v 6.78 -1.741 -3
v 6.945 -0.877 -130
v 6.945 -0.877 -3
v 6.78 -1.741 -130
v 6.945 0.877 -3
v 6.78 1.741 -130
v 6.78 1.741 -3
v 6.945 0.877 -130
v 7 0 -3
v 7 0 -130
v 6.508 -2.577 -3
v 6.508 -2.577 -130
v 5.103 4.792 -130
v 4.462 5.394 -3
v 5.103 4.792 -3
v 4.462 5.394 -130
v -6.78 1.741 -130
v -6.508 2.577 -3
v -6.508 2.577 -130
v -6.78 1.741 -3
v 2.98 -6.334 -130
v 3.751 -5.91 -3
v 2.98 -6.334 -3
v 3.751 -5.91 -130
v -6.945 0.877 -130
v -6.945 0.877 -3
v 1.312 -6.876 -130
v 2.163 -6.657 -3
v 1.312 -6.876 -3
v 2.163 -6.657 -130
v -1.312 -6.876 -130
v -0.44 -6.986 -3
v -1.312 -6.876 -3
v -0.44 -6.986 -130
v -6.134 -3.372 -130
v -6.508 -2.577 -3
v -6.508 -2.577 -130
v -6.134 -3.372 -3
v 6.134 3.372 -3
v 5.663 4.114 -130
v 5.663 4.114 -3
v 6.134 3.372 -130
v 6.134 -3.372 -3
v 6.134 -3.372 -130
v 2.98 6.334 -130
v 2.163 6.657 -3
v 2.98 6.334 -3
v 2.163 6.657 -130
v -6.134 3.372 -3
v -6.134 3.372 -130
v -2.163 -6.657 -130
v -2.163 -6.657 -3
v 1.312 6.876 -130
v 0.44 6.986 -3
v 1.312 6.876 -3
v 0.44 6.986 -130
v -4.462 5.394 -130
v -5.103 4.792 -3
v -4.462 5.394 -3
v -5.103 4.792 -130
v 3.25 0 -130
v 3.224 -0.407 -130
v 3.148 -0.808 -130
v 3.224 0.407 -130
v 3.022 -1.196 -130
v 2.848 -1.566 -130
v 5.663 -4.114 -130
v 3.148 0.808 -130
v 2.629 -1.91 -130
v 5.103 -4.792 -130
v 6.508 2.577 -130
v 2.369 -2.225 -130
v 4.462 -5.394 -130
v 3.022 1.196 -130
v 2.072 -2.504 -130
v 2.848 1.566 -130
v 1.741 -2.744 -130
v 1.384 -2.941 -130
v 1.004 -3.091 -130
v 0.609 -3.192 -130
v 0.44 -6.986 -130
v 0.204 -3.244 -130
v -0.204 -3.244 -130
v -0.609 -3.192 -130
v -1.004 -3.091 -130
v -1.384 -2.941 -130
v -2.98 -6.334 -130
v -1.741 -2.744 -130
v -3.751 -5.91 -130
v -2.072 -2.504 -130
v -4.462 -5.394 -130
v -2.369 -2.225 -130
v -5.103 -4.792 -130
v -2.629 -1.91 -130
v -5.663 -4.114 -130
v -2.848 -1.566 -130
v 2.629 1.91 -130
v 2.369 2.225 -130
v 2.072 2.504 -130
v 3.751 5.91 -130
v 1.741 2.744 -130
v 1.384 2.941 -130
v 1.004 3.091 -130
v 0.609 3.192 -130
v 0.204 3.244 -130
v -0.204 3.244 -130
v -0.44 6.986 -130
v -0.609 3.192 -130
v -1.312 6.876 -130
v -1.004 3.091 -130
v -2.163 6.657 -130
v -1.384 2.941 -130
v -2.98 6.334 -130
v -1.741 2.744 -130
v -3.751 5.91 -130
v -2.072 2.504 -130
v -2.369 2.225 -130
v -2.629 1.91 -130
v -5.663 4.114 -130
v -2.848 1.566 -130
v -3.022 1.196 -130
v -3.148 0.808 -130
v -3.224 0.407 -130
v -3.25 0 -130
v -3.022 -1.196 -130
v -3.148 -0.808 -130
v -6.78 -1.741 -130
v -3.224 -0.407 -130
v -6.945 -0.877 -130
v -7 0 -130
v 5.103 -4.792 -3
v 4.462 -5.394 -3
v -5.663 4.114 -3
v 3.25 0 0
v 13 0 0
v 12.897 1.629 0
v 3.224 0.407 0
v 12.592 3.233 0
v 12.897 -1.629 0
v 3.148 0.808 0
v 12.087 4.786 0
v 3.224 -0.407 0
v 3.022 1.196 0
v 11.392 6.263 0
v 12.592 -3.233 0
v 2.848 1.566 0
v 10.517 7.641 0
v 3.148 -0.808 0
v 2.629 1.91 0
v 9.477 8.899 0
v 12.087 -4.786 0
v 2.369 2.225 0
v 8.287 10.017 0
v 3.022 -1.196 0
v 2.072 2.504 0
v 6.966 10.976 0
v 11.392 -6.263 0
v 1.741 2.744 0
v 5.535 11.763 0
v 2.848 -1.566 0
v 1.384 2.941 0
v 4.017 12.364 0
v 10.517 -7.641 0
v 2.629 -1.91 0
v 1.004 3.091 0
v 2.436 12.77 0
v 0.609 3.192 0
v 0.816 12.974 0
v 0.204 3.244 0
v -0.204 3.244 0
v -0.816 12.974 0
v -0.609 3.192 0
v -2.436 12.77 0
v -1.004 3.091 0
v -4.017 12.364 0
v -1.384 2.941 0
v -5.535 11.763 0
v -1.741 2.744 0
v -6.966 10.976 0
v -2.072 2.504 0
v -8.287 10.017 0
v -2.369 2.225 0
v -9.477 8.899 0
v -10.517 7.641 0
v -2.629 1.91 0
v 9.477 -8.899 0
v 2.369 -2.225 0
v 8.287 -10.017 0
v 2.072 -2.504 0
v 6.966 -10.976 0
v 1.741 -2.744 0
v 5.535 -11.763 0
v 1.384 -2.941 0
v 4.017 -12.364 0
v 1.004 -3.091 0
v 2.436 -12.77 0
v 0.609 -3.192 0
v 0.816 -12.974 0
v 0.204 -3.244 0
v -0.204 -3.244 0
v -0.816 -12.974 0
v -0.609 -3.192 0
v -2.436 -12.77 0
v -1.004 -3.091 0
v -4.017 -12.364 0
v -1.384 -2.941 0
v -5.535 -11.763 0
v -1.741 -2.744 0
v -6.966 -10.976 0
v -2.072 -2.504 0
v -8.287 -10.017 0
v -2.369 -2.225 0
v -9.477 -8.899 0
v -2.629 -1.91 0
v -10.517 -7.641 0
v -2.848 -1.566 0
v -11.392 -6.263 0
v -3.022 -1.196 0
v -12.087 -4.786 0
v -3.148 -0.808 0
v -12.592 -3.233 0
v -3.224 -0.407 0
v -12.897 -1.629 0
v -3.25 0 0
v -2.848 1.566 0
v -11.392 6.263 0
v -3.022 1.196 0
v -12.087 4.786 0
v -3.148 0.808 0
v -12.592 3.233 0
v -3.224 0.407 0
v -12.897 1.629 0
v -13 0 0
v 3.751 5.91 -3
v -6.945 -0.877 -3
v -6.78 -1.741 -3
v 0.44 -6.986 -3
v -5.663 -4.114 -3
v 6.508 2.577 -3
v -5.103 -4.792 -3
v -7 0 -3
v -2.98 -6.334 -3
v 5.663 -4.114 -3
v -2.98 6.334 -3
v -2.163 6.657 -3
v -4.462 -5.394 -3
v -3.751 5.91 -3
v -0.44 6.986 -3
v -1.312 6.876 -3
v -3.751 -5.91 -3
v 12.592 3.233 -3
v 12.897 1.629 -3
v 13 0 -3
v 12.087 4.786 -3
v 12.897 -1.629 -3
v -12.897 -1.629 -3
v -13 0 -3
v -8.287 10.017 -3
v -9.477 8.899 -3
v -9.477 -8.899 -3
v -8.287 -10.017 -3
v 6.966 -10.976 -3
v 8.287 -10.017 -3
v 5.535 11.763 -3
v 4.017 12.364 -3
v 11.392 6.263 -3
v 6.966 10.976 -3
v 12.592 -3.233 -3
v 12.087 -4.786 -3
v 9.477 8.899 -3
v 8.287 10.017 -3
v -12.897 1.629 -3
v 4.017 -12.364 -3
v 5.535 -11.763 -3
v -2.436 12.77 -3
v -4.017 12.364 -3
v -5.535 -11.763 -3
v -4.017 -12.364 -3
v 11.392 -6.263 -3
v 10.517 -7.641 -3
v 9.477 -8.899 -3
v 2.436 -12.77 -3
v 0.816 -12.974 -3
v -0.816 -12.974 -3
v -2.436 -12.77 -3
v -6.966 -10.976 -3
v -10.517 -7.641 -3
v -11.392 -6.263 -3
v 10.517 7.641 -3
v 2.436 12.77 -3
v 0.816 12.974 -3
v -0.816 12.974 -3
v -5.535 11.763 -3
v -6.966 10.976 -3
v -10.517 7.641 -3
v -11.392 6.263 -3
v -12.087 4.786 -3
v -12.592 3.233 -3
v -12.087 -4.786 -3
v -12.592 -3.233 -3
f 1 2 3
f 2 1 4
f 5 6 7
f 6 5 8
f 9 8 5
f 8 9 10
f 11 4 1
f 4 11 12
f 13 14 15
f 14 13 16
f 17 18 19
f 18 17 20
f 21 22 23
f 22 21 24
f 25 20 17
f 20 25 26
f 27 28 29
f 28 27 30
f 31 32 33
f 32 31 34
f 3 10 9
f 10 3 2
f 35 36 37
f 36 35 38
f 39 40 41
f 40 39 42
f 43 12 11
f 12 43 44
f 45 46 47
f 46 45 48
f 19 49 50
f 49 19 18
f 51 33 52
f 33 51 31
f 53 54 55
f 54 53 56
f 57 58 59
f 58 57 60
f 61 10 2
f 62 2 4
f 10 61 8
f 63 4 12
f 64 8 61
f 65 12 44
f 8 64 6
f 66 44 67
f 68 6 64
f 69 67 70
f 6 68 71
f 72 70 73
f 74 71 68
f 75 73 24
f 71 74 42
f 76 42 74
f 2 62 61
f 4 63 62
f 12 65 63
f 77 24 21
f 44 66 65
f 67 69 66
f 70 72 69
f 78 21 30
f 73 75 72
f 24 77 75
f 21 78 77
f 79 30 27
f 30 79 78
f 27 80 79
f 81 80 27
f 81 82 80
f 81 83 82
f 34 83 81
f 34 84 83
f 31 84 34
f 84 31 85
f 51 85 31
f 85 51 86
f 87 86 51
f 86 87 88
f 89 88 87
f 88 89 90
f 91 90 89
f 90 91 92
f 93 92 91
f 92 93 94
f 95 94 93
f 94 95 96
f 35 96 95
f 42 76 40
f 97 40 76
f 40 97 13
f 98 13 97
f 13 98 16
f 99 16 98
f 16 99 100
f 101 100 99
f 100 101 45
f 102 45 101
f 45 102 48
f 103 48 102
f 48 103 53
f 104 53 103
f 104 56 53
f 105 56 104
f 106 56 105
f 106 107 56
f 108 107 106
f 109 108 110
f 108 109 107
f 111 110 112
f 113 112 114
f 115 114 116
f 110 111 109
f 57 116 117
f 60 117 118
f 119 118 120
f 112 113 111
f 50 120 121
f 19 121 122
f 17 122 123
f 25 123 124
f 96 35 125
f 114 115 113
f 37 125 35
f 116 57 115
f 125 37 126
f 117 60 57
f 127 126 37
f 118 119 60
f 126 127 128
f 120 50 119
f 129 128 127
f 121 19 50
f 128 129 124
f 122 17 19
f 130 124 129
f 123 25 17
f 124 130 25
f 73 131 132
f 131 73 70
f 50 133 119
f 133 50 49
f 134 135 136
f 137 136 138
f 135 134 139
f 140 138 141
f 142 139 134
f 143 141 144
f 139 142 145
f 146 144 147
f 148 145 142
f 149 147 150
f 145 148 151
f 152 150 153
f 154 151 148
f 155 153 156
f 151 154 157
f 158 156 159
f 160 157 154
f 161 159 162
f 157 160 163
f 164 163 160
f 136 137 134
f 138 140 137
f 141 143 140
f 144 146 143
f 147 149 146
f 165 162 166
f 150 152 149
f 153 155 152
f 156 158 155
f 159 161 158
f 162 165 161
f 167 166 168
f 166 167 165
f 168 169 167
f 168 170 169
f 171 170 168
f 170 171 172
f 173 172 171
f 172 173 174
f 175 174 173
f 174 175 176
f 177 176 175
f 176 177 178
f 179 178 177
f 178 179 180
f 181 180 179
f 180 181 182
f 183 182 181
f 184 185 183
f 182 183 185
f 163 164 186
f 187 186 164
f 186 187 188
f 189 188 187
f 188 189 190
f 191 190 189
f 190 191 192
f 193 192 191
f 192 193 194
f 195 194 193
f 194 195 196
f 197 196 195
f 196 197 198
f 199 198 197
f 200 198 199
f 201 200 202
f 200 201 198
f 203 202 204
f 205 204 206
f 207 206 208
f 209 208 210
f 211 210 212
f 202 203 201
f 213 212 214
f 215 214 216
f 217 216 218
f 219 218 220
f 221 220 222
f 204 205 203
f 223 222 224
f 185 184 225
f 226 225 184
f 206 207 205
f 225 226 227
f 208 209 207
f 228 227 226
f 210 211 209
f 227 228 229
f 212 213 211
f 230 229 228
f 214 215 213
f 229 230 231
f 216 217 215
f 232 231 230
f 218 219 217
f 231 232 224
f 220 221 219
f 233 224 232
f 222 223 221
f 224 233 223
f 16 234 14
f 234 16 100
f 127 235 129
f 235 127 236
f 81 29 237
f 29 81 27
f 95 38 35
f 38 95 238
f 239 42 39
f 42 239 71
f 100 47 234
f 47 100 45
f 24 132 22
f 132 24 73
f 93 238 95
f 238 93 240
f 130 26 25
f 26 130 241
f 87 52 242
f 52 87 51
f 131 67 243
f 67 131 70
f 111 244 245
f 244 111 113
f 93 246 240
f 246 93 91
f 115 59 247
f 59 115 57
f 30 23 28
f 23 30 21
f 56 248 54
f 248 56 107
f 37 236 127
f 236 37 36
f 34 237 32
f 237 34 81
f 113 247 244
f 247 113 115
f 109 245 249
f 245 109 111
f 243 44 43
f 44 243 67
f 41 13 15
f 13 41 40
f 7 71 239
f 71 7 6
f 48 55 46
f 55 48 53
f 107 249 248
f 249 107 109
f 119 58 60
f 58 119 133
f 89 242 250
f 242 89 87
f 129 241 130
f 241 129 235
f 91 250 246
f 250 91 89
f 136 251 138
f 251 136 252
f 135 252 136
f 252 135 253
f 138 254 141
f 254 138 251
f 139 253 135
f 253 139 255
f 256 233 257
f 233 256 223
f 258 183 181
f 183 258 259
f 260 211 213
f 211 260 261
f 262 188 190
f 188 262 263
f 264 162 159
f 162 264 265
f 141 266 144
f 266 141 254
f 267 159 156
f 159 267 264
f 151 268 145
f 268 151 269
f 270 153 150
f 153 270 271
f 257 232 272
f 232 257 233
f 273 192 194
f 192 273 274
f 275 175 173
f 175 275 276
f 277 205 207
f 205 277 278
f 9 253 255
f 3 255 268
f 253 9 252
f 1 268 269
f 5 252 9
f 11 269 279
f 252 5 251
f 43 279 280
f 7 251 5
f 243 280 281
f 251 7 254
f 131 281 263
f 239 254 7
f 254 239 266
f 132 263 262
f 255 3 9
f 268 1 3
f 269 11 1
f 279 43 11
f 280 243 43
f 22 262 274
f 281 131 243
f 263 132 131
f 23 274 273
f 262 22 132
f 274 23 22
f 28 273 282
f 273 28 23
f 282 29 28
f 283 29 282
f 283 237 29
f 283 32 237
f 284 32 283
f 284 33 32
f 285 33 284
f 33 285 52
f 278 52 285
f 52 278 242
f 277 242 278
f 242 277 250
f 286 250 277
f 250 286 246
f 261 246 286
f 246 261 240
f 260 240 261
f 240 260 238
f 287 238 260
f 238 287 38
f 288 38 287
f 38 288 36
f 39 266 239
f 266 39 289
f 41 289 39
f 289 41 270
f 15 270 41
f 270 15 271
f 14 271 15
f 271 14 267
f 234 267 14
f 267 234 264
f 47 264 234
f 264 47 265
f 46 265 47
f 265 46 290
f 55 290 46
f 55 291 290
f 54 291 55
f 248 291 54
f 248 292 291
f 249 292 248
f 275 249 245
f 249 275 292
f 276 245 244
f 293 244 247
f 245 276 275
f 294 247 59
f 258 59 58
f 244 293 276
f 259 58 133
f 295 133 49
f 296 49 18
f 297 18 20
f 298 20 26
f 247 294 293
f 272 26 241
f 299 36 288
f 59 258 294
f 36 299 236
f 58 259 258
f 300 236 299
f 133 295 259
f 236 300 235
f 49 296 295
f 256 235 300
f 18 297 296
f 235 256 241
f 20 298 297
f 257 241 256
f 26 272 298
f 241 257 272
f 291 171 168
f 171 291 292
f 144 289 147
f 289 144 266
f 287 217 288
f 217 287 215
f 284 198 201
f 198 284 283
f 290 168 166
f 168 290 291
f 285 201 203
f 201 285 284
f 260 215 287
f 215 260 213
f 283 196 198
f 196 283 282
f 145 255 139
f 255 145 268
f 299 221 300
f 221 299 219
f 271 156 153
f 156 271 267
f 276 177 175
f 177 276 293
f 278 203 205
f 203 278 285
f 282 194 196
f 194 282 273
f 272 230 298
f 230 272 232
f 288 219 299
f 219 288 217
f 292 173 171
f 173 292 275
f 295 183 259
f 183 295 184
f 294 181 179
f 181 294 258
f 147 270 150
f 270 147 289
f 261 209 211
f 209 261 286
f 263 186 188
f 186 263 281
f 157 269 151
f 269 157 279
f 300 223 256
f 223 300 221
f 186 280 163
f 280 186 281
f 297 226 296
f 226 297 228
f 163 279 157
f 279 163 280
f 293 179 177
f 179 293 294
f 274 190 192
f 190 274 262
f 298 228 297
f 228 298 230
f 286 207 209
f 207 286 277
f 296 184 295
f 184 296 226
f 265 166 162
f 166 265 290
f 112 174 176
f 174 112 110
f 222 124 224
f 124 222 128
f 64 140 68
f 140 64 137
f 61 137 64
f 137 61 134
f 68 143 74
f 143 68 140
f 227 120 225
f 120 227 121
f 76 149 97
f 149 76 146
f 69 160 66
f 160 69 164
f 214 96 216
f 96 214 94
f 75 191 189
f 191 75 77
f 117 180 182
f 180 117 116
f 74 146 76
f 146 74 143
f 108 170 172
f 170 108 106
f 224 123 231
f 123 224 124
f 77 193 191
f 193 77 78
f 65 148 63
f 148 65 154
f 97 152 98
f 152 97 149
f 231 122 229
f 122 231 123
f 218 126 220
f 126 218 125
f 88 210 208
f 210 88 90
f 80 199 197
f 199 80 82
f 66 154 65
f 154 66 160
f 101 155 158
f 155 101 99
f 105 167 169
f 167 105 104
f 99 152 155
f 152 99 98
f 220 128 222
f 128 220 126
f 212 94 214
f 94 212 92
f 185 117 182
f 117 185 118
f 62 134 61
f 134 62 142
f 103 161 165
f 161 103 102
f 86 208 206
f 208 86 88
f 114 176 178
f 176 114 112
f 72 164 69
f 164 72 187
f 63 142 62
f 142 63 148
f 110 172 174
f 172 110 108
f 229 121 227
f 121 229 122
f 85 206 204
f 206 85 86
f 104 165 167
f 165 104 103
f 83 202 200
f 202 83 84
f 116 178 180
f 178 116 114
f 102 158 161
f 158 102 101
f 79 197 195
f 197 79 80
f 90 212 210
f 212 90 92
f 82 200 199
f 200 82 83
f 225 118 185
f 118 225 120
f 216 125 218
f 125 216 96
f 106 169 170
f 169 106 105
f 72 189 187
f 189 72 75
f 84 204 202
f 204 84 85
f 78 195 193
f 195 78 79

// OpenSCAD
$fn = 50;


difference() {
	union() {
		translate(v = [0, 0, -130.0000000000]) {
			cylinder(h = 130, r = 7.0000000000);
		}
		translate(v = [0, 0, -3.0000000000]) {
			cylinder(h = 3, r = 13.0000000000);
		}
	}
	union() {
		#translate(v = [0, 0, -130]) {
			cylinder(h = 130, r = 3.2500000000);
		}
	}
}
